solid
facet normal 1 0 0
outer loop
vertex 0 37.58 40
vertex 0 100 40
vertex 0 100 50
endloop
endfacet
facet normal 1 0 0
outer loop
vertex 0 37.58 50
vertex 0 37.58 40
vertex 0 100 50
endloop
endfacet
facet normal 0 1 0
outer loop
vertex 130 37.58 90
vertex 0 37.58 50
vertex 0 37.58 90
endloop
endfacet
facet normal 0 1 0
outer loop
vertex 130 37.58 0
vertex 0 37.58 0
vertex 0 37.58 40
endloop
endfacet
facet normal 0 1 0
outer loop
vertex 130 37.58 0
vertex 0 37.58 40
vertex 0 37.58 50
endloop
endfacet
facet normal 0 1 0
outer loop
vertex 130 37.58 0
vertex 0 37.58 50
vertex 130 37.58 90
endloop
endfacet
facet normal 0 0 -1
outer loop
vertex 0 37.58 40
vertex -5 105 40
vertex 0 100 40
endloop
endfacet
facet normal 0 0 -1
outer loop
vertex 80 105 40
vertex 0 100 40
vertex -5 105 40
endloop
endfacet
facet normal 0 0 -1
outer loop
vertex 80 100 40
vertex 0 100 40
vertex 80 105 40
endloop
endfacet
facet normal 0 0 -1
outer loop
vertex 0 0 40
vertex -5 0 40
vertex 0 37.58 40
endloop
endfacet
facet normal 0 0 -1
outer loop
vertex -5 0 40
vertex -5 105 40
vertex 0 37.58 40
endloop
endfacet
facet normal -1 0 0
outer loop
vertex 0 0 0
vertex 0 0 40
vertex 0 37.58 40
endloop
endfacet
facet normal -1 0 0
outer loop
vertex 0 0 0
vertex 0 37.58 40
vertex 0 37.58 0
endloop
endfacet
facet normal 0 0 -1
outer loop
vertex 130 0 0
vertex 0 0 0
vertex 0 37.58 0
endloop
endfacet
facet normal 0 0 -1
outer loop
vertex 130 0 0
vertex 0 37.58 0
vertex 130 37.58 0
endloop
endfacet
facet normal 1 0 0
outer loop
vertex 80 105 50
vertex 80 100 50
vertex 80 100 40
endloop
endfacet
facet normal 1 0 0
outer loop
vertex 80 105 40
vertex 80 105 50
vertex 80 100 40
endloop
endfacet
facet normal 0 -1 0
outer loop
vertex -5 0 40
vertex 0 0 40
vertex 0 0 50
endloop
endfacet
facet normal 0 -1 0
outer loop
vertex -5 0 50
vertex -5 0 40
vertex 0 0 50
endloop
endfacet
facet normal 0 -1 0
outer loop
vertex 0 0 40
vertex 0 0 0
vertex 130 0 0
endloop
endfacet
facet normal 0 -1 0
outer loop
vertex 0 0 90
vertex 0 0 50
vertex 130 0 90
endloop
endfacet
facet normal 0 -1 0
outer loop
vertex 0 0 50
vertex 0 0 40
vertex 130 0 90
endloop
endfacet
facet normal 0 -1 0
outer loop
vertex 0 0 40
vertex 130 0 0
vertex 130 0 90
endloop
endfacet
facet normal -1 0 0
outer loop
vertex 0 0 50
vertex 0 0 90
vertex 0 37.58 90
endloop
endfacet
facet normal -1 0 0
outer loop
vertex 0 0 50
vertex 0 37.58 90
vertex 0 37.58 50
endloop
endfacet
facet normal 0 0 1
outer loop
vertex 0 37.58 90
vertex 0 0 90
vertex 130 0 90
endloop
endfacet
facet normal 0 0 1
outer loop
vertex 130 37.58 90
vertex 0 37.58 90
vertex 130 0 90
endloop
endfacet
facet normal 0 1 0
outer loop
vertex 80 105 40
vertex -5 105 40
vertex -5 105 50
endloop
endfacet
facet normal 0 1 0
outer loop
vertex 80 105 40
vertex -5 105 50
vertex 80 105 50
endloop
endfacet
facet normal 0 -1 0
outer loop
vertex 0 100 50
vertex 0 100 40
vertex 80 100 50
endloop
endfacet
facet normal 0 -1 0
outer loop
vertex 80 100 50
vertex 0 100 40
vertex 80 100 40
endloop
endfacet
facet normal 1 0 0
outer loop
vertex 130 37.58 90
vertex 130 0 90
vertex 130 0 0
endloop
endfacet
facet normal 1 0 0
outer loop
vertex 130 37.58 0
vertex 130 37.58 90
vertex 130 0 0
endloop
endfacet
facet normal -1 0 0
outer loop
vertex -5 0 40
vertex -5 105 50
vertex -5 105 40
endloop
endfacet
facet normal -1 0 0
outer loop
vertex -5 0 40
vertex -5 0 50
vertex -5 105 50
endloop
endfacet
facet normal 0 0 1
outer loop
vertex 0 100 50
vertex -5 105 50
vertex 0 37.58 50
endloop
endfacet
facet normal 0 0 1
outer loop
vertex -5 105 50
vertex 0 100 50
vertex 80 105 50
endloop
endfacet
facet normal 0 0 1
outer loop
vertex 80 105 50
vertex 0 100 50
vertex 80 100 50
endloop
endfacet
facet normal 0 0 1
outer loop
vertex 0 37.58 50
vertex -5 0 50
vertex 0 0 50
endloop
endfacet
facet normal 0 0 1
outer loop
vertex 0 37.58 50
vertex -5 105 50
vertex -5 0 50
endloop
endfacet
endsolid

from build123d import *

# Parameters (mm, degrees)
SKETCH1_W           = 130
SKETCH1_H           = 90
BOSS_EXTRUDE1_DEPTH = 37.58
SKETCH2_W           = 10
SKETCH2_H           = 100
BOSS_EXTRUDE2_DEPTH = 5
SKETCH3_W           = 85
SKETCH3_H           = 10
BOSS_EXTRUDE3_DEPTH = 5


with BuildPart() as part:
    # Sketch1 → Boss-Extrude1 (new body)
    with BuildSketch(Plane(origin=(0, 0, 0), x_dir=(1, 0, 0), z_dir=(0, 1, 0))):
        with Locations((65, -45)):
            Rectangle(SKETCH1_W, SKETCH1_H)
    extrude(amount=BOSS_EXTRUDE1_DEPTH)

    # Sketch2 → Boss-Extrude2 (add)
    with BuildSketch(Plane.ZY):
        with Locations((45, 50)):
            Rectangle(SKETCH2_W, SKETCH2_H)
    extrude(amount=BOSS_EXTRUDE2_DEPTH)

    # Sketch3 → Boss-Extrude3 (add)
    with BuildSketch(Plane(origin=(0, 100, 0), x_dir=(1, 0, 0), z_dir=(0, 1, 0))):
        with Locations((37.5, -45)):
            Rectangle(SKETCH3_W, SKETCH3_H)
    extrude(amount=BOSS_EXTRUDE3_DEPTH)


solid = part.part
